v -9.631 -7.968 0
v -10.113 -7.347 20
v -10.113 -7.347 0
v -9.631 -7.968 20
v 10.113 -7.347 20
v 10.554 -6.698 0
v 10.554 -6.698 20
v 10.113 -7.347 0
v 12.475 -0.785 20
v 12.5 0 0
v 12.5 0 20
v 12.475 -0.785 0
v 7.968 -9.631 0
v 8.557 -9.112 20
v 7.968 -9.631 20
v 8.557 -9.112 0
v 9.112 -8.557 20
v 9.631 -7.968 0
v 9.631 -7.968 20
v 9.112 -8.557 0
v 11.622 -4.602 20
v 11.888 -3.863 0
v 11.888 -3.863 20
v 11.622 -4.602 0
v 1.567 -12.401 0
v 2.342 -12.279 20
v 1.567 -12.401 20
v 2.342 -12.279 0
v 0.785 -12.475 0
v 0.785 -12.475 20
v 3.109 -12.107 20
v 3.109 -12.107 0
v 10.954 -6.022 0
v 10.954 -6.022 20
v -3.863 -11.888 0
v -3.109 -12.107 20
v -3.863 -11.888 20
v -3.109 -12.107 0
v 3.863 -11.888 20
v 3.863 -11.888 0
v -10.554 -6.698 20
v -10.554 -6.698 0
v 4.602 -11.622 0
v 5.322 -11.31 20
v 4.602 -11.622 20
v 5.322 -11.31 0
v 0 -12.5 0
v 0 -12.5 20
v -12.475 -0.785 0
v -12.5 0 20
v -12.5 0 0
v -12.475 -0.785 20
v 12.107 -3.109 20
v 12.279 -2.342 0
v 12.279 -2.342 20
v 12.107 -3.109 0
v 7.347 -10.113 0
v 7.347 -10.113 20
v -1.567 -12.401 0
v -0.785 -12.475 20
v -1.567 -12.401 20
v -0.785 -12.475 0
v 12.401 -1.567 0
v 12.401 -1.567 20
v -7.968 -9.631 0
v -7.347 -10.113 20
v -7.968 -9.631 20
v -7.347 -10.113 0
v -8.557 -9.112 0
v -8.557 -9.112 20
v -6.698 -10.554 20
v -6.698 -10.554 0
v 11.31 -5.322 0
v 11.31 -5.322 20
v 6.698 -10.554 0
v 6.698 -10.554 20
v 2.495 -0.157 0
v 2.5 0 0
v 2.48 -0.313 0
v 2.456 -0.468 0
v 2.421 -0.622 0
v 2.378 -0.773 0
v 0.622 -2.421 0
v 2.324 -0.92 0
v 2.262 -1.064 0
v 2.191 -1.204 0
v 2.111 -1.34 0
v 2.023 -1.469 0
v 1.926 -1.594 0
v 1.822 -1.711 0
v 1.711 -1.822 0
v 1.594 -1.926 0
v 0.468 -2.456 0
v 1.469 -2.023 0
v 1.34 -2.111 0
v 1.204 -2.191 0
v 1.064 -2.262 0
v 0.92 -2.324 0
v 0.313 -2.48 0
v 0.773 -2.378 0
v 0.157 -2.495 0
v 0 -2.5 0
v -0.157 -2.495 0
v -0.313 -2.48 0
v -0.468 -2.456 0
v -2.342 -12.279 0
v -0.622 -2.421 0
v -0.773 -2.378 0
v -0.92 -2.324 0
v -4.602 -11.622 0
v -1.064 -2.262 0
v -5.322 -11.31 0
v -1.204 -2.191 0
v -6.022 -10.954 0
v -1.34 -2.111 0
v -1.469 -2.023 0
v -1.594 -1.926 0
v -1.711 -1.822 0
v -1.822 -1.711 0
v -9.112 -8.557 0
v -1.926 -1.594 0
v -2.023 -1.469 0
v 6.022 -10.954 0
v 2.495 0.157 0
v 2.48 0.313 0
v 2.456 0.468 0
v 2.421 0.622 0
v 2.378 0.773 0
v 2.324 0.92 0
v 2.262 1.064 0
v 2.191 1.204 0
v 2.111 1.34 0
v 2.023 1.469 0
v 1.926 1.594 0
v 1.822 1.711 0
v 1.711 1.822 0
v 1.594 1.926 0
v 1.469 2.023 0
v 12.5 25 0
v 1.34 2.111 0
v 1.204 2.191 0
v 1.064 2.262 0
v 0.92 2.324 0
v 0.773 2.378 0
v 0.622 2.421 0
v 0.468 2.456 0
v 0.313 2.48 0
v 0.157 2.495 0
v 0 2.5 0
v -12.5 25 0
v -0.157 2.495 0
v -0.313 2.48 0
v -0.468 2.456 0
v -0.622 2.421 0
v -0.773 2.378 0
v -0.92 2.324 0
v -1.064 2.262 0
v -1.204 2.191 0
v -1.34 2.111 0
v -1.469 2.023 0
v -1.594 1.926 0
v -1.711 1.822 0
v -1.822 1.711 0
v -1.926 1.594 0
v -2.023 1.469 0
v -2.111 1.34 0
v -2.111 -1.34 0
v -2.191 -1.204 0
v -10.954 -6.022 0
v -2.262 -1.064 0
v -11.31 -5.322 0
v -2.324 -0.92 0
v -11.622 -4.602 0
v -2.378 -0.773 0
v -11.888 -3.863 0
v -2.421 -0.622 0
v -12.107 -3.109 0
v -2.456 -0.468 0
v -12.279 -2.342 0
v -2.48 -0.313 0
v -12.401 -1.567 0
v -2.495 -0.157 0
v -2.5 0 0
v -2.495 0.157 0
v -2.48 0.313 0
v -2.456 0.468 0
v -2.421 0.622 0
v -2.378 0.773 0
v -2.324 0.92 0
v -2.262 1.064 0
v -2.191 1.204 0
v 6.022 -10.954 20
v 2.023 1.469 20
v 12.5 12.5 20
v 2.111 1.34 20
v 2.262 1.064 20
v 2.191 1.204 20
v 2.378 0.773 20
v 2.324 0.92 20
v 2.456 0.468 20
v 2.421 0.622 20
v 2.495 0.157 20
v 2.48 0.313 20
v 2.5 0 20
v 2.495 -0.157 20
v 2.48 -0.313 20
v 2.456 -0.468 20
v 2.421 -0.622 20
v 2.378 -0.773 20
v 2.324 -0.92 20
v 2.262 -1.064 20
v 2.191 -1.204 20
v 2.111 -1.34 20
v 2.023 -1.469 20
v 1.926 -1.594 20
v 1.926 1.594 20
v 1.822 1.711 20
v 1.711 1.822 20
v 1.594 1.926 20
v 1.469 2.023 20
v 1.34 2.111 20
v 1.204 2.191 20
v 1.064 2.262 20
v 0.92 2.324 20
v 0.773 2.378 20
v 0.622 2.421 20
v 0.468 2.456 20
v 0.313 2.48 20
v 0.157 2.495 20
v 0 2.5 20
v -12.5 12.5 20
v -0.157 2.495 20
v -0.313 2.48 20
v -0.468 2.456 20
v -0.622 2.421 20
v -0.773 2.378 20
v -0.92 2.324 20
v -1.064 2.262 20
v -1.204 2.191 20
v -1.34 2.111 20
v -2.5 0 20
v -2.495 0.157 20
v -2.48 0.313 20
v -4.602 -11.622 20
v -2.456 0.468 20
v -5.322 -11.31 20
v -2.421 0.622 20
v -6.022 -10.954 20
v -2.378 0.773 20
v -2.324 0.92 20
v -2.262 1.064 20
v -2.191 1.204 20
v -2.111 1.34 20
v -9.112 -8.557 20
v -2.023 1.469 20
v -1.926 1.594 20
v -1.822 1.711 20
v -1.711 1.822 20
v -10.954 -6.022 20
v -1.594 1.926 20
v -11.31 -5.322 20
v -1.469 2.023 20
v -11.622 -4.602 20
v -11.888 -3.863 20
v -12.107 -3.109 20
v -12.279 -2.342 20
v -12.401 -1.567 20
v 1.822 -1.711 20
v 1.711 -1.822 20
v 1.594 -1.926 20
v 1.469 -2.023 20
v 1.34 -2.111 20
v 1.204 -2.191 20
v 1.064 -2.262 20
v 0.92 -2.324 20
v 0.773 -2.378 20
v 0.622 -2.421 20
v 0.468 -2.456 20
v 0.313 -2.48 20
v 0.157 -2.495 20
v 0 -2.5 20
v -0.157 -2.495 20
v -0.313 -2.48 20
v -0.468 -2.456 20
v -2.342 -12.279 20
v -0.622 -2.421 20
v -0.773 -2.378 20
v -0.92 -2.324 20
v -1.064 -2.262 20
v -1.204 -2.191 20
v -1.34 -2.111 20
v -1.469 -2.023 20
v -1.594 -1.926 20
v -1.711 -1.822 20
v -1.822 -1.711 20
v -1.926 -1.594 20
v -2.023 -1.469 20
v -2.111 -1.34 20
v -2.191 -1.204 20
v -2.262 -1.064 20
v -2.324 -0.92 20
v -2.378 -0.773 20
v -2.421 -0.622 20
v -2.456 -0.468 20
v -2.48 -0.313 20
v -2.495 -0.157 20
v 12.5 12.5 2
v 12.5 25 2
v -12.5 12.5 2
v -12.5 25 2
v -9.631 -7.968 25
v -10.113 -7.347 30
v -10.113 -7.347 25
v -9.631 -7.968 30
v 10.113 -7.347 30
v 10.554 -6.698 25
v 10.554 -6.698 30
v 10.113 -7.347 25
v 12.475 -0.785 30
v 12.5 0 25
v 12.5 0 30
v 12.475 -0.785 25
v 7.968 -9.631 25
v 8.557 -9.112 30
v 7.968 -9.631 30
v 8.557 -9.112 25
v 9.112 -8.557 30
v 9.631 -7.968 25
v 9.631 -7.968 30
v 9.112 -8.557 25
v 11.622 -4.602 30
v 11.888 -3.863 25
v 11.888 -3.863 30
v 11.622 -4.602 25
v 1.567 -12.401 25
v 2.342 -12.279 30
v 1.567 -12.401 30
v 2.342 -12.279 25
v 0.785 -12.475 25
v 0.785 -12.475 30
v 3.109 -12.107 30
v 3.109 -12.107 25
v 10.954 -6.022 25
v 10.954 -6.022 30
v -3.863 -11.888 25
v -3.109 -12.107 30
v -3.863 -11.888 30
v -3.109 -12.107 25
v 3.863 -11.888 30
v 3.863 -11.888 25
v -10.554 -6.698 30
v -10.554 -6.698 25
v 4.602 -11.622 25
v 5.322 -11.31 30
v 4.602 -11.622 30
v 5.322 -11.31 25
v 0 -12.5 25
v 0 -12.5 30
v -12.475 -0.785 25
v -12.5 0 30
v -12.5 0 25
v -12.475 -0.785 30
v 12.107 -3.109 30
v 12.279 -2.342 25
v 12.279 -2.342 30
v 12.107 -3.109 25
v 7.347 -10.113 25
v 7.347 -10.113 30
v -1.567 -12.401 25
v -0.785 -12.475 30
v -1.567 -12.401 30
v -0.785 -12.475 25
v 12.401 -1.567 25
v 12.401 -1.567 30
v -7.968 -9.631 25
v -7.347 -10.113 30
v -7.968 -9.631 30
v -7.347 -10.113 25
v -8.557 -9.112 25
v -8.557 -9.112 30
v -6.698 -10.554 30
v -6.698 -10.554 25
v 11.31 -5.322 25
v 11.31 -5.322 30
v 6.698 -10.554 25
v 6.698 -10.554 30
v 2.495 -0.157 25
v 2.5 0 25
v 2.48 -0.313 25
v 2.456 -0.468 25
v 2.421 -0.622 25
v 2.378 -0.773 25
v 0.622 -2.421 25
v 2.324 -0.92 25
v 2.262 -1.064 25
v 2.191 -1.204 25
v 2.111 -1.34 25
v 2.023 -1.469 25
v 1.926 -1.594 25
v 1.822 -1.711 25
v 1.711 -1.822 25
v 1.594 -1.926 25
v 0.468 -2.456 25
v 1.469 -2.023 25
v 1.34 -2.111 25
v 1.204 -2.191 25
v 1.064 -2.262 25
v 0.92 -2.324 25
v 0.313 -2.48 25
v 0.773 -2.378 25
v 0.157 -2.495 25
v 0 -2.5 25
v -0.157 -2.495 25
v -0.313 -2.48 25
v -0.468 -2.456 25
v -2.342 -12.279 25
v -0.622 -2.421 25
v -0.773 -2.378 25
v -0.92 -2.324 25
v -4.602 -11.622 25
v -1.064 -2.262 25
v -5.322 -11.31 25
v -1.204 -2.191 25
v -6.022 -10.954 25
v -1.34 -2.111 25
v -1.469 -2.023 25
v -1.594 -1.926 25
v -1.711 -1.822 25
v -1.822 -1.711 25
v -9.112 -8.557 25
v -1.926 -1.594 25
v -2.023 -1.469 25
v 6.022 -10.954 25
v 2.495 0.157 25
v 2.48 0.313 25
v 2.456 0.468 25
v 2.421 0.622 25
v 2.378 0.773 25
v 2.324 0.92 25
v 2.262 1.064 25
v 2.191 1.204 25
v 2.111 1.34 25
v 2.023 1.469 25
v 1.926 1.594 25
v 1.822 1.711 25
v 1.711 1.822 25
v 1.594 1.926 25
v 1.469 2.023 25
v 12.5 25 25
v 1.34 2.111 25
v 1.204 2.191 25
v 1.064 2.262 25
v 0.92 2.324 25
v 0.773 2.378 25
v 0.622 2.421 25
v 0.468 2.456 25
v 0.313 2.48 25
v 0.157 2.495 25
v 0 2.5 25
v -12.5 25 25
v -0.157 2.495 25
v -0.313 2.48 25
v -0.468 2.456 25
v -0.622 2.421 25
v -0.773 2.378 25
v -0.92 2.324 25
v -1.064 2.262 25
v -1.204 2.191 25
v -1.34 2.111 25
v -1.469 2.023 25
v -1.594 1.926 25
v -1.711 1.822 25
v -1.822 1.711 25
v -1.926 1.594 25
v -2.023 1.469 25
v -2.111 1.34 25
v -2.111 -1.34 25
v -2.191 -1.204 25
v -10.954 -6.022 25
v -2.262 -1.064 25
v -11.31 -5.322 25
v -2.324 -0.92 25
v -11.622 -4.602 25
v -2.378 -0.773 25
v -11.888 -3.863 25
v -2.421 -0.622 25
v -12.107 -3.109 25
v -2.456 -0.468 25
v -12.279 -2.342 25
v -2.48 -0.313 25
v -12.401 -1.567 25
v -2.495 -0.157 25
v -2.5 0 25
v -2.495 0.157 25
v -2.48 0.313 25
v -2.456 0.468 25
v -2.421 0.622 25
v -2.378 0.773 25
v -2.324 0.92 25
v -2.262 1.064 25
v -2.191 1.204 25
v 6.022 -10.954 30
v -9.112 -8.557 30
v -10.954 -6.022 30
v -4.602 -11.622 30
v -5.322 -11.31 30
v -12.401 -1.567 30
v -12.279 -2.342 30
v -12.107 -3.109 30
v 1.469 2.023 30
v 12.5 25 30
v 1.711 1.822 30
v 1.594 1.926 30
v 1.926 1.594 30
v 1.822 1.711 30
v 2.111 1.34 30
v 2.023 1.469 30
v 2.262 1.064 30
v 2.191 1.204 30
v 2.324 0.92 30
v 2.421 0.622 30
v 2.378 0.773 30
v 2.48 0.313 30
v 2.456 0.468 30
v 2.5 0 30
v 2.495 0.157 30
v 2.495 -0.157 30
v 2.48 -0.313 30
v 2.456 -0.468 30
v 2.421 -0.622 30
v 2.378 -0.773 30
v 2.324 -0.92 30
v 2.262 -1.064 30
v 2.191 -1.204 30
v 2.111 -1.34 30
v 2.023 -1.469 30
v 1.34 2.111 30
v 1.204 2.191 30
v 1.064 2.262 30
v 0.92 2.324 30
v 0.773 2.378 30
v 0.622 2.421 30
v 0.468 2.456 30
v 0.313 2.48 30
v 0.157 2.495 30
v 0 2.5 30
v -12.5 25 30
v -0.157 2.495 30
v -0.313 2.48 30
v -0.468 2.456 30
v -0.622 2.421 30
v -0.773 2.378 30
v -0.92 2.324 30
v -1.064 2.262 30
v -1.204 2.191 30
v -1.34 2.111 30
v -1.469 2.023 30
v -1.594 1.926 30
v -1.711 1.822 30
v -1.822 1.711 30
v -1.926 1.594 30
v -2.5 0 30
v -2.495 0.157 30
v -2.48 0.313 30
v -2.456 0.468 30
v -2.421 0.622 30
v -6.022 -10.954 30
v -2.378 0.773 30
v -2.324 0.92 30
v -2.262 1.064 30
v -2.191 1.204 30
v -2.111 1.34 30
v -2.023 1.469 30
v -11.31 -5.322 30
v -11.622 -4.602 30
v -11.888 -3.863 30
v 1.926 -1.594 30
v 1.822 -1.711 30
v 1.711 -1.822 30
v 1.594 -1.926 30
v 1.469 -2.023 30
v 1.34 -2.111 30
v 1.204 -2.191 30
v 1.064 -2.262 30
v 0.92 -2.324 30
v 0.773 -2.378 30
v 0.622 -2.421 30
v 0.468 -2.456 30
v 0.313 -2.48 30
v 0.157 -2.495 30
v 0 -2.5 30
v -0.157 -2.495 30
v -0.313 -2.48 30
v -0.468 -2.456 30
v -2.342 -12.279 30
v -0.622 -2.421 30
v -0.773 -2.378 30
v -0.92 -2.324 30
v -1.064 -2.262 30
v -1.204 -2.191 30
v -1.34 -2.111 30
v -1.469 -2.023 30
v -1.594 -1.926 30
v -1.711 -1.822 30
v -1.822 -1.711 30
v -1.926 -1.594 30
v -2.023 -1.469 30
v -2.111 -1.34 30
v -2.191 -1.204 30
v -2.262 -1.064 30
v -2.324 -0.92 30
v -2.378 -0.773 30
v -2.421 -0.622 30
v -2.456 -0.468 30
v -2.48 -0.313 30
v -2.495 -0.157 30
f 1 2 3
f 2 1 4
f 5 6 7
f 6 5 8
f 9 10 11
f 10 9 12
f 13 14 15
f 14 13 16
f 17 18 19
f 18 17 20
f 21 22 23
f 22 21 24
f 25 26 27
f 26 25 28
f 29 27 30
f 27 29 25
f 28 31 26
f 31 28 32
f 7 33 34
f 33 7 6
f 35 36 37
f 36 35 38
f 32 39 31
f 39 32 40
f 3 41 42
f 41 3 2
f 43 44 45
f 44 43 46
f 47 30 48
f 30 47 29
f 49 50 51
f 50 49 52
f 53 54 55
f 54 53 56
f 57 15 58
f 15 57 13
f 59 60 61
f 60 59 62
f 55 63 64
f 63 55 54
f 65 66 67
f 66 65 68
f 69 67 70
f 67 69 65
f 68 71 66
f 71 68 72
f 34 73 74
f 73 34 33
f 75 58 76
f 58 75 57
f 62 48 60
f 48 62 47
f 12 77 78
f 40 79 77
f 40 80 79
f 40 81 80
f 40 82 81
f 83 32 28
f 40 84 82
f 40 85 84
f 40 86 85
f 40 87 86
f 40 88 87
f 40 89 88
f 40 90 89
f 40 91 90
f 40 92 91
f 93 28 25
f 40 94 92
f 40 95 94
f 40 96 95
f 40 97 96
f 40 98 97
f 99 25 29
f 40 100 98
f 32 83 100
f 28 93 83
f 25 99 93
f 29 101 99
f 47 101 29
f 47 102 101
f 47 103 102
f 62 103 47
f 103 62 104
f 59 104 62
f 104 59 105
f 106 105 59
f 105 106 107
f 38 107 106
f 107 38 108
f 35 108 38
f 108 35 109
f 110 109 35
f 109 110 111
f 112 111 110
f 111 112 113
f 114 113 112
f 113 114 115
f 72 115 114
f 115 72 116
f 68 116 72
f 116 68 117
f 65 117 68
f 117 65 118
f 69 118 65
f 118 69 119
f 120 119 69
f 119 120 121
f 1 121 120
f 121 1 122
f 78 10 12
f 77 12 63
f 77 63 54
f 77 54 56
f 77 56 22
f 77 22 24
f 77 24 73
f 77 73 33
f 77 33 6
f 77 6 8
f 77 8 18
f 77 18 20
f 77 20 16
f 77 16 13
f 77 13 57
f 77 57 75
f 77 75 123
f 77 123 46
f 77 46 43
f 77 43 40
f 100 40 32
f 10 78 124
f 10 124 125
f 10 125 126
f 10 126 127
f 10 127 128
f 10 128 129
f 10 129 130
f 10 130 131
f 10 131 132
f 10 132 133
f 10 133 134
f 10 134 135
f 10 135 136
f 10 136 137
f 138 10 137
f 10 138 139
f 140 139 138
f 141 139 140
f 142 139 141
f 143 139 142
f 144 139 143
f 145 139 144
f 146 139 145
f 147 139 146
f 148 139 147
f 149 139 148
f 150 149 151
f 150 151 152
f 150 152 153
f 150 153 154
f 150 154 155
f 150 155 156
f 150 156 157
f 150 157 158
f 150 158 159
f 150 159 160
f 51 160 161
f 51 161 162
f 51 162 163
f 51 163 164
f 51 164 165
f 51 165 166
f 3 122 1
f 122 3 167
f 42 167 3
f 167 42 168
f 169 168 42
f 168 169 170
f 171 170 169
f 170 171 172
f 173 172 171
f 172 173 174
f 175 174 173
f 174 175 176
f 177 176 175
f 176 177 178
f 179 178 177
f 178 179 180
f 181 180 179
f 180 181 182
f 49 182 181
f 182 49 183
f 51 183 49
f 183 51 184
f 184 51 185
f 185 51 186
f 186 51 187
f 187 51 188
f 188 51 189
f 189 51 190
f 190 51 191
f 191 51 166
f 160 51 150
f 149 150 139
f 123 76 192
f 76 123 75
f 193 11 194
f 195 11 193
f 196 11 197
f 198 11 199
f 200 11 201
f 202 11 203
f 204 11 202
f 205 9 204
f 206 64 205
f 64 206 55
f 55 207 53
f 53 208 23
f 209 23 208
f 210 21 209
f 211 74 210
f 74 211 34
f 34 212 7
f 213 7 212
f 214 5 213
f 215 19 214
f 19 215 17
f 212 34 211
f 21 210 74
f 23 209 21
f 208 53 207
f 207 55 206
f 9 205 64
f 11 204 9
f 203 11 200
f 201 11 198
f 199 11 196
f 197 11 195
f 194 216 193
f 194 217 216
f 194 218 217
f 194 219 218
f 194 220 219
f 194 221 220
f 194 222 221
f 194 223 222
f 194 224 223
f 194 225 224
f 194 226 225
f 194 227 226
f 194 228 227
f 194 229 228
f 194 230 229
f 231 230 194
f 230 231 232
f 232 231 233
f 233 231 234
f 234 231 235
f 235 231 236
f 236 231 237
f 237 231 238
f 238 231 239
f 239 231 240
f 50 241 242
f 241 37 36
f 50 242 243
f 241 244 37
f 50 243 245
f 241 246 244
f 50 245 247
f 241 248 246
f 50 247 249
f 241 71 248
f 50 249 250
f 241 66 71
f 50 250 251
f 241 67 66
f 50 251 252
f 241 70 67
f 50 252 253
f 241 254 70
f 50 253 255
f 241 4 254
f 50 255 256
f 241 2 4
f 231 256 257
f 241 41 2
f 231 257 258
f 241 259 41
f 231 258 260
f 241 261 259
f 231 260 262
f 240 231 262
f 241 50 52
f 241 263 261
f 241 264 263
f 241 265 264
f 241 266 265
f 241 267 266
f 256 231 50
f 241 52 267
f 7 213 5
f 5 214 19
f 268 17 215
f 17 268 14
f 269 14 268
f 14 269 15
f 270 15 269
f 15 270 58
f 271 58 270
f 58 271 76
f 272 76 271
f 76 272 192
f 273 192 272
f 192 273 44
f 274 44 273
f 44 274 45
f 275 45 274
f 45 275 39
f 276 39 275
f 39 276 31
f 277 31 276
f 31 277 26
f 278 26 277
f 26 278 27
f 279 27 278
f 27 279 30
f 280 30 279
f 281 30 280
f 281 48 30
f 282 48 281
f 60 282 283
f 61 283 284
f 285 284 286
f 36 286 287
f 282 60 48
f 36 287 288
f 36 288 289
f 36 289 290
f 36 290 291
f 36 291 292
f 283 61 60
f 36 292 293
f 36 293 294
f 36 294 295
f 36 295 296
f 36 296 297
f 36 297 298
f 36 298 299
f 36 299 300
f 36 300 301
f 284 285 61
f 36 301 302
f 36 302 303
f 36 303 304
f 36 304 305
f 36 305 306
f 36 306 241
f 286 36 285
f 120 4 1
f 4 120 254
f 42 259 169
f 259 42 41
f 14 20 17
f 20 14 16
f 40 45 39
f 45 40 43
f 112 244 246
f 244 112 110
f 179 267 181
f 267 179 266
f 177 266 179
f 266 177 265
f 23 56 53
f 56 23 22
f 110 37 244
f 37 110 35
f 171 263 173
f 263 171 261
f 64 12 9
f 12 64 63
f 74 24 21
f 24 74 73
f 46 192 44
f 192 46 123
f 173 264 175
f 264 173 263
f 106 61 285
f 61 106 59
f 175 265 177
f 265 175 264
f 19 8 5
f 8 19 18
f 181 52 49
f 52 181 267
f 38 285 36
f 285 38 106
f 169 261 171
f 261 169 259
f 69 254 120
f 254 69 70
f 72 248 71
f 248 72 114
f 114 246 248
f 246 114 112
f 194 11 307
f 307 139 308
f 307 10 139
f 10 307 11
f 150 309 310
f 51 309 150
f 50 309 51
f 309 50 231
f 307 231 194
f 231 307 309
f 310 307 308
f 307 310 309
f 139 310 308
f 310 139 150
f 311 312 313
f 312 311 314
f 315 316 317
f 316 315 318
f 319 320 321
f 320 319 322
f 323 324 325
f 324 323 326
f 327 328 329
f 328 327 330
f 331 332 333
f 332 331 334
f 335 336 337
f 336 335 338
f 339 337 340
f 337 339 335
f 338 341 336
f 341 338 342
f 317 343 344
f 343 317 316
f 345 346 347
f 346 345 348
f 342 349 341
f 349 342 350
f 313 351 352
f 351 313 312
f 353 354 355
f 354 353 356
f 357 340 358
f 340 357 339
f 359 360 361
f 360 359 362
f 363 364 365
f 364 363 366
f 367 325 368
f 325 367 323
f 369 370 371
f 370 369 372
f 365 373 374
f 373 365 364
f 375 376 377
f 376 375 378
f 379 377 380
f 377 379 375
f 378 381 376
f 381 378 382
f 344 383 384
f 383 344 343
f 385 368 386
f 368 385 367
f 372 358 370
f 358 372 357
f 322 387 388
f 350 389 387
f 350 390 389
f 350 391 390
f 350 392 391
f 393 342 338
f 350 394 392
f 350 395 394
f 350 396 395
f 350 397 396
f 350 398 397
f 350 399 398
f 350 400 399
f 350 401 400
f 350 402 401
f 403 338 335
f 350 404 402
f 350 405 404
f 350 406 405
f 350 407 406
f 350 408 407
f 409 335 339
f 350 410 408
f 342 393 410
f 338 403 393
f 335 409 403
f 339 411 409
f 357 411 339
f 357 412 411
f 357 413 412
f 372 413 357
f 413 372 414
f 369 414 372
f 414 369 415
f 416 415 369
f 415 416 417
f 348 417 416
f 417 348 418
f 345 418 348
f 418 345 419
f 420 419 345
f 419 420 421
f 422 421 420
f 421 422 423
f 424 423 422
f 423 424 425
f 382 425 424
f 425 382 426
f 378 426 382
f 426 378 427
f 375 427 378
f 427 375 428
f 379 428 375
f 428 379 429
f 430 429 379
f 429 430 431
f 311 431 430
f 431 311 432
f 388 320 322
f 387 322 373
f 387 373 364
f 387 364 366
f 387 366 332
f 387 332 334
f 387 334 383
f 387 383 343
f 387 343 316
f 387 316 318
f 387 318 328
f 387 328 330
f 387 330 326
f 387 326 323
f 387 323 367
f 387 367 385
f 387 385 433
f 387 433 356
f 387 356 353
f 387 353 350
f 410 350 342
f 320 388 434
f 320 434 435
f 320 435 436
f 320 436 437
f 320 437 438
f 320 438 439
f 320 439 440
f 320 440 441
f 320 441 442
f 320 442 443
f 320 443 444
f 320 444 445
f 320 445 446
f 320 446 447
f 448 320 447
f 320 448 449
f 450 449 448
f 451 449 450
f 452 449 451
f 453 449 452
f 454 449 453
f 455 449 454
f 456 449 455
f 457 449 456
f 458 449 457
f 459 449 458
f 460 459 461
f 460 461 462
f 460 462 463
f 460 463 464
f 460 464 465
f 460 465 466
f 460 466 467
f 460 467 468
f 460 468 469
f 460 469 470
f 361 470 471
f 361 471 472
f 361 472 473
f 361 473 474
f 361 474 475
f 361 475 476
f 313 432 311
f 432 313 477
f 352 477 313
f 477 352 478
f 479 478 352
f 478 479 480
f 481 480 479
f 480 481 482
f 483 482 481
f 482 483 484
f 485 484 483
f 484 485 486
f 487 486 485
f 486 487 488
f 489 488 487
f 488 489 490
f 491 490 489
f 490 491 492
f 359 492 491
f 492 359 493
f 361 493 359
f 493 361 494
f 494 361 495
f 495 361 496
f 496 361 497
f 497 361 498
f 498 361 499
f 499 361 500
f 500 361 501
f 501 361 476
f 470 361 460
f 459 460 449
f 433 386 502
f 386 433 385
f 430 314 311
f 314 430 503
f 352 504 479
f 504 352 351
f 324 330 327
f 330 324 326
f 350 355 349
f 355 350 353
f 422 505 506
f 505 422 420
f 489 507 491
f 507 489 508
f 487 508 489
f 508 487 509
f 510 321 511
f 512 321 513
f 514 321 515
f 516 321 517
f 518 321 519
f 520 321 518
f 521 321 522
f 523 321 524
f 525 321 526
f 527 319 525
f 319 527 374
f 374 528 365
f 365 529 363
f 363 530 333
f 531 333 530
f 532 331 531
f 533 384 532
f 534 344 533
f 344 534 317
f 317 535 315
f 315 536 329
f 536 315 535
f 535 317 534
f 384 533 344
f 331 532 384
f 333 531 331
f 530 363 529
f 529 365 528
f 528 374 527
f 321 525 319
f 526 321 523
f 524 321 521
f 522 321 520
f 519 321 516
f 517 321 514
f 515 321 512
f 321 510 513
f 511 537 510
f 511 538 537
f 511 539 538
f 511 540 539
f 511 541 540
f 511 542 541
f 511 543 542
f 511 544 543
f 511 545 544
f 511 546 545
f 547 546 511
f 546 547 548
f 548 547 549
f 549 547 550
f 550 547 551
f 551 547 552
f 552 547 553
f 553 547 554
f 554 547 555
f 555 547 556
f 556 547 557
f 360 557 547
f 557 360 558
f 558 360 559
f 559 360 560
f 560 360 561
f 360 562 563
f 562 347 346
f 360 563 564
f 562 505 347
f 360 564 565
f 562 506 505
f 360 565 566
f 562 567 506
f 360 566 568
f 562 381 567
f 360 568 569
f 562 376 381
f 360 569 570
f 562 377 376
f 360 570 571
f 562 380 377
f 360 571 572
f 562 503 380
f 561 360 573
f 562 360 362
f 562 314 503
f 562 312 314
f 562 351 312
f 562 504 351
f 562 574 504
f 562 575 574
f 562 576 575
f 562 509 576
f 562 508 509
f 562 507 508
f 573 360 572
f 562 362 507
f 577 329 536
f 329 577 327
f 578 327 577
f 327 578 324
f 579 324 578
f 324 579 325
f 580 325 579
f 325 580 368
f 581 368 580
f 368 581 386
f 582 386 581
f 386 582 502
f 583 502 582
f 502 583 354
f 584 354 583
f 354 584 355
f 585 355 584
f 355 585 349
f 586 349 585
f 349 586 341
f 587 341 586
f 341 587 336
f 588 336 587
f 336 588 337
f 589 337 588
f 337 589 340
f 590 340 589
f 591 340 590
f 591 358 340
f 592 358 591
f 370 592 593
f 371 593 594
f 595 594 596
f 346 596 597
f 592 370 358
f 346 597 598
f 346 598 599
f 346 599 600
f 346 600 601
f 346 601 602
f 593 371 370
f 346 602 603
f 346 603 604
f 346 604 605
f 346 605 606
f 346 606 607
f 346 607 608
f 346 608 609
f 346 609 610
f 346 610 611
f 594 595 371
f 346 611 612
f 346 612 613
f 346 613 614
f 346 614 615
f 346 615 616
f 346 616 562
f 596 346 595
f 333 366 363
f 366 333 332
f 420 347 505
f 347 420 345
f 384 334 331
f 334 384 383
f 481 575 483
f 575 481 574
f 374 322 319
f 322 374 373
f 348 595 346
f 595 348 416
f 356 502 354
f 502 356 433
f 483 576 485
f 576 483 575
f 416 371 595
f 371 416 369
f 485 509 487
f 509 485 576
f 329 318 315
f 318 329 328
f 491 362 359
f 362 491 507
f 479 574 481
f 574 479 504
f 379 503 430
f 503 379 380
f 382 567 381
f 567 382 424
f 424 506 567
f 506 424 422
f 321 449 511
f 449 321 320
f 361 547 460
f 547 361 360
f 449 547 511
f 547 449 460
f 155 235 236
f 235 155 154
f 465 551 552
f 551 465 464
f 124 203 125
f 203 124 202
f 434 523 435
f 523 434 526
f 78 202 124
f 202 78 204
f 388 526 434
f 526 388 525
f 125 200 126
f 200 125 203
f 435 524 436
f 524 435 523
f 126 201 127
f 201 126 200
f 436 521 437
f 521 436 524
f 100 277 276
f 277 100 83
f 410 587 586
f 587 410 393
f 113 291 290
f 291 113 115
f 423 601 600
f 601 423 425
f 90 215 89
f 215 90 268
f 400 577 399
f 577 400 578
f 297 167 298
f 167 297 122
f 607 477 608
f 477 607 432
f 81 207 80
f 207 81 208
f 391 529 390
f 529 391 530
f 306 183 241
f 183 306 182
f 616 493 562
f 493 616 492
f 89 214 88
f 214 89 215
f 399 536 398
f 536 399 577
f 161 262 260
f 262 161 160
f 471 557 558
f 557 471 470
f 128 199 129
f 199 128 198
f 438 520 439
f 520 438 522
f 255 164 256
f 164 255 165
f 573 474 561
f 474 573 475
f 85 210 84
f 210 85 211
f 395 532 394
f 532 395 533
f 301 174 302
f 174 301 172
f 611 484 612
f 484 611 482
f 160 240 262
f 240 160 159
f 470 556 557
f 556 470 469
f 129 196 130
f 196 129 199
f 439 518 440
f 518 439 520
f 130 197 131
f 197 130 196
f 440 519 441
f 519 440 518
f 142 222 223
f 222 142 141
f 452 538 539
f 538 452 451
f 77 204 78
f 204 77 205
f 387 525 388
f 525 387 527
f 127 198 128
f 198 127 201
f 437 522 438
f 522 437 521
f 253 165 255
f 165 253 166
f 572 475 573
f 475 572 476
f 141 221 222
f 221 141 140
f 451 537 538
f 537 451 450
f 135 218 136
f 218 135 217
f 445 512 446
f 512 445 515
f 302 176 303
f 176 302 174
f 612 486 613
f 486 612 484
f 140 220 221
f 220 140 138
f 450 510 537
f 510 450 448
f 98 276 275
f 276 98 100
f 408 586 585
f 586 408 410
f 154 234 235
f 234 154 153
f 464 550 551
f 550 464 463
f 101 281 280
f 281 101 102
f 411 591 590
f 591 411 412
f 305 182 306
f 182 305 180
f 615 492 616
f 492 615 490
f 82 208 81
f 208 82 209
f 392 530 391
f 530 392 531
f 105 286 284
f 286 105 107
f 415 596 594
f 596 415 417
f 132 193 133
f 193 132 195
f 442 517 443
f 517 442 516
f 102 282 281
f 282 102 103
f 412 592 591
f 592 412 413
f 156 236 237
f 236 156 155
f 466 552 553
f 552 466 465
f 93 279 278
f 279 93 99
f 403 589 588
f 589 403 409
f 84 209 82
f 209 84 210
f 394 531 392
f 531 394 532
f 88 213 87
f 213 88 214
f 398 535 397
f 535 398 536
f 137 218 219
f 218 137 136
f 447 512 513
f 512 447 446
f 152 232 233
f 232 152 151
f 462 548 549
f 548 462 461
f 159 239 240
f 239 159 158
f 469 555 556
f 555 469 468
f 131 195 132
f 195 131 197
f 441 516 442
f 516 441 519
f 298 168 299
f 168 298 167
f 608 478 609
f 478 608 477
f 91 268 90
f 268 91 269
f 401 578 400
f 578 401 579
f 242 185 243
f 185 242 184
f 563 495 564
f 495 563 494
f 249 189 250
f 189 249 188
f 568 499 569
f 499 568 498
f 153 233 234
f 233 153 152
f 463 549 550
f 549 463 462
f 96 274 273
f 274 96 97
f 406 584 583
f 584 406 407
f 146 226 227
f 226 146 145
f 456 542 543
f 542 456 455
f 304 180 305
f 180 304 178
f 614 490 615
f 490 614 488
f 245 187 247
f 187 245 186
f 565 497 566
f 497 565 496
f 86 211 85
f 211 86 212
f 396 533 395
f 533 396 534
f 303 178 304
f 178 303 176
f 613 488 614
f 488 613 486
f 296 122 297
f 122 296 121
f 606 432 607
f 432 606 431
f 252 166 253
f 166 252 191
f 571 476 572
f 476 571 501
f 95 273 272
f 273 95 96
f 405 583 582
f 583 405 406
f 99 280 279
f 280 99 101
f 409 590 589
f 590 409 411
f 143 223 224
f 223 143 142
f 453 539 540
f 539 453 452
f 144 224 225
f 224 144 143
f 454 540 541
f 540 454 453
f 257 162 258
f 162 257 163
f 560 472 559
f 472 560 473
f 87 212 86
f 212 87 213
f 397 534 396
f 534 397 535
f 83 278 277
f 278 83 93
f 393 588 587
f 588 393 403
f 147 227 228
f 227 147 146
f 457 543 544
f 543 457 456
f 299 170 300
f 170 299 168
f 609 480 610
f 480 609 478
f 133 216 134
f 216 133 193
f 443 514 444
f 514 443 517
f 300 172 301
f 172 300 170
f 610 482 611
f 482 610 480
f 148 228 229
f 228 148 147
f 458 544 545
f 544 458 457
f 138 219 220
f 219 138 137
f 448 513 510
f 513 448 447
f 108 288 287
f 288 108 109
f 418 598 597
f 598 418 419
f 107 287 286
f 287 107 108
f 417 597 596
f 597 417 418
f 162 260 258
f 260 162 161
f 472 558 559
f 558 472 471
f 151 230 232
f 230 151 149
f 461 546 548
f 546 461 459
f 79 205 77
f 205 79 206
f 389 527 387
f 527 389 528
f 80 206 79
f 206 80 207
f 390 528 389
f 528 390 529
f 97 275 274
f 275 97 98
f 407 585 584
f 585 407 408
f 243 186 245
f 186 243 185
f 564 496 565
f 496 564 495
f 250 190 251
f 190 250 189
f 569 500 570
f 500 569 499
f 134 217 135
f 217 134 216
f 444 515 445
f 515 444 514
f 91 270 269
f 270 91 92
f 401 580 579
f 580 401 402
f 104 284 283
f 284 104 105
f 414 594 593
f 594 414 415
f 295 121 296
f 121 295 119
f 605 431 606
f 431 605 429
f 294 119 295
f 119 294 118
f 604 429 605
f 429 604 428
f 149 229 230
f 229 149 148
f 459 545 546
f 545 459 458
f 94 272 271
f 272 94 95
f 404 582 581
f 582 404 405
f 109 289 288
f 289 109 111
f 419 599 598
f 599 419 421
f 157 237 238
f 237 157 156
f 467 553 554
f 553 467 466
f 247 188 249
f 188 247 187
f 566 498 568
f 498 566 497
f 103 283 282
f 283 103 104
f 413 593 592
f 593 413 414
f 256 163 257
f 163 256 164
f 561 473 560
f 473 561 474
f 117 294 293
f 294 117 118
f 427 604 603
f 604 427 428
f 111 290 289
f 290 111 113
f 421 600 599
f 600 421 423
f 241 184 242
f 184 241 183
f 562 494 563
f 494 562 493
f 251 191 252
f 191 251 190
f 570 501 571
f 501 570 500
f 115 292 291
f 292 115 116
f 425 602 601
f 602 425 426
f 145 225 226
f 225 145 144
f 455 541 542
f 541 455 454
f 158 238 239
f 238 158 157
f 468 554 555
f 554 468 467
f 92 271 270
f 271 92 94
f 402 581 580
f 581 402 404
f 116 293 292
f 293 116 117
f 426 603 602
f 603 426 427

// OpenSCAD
// Setup
$fn = 100;
$fa = 1;
$fs = 0.4;

plywood = 18.0;
width   = 25.0;
filet   = 2.0;
latch   = 5.0;
hole    = 5.0;

difference() {
    union() {
        cylinder(h=plywood+filet,d=width,center=false);
        translate([-width/2,0,0]) cube([width,width/2,plywood+filet],center=false);
        translate([-width/2,0,0]) cube([width,width,filet]);
        
        translate([0,0,plywood+filet+5]) cylinder(h=latch,d=width,center=false);
        translate([-width/2,0,plywood+filet+5]) cube([width,width,latch],center=false);
    }
    cylinder(h = plywood+filet+5+latch+5, d=hole,center=false);
}
